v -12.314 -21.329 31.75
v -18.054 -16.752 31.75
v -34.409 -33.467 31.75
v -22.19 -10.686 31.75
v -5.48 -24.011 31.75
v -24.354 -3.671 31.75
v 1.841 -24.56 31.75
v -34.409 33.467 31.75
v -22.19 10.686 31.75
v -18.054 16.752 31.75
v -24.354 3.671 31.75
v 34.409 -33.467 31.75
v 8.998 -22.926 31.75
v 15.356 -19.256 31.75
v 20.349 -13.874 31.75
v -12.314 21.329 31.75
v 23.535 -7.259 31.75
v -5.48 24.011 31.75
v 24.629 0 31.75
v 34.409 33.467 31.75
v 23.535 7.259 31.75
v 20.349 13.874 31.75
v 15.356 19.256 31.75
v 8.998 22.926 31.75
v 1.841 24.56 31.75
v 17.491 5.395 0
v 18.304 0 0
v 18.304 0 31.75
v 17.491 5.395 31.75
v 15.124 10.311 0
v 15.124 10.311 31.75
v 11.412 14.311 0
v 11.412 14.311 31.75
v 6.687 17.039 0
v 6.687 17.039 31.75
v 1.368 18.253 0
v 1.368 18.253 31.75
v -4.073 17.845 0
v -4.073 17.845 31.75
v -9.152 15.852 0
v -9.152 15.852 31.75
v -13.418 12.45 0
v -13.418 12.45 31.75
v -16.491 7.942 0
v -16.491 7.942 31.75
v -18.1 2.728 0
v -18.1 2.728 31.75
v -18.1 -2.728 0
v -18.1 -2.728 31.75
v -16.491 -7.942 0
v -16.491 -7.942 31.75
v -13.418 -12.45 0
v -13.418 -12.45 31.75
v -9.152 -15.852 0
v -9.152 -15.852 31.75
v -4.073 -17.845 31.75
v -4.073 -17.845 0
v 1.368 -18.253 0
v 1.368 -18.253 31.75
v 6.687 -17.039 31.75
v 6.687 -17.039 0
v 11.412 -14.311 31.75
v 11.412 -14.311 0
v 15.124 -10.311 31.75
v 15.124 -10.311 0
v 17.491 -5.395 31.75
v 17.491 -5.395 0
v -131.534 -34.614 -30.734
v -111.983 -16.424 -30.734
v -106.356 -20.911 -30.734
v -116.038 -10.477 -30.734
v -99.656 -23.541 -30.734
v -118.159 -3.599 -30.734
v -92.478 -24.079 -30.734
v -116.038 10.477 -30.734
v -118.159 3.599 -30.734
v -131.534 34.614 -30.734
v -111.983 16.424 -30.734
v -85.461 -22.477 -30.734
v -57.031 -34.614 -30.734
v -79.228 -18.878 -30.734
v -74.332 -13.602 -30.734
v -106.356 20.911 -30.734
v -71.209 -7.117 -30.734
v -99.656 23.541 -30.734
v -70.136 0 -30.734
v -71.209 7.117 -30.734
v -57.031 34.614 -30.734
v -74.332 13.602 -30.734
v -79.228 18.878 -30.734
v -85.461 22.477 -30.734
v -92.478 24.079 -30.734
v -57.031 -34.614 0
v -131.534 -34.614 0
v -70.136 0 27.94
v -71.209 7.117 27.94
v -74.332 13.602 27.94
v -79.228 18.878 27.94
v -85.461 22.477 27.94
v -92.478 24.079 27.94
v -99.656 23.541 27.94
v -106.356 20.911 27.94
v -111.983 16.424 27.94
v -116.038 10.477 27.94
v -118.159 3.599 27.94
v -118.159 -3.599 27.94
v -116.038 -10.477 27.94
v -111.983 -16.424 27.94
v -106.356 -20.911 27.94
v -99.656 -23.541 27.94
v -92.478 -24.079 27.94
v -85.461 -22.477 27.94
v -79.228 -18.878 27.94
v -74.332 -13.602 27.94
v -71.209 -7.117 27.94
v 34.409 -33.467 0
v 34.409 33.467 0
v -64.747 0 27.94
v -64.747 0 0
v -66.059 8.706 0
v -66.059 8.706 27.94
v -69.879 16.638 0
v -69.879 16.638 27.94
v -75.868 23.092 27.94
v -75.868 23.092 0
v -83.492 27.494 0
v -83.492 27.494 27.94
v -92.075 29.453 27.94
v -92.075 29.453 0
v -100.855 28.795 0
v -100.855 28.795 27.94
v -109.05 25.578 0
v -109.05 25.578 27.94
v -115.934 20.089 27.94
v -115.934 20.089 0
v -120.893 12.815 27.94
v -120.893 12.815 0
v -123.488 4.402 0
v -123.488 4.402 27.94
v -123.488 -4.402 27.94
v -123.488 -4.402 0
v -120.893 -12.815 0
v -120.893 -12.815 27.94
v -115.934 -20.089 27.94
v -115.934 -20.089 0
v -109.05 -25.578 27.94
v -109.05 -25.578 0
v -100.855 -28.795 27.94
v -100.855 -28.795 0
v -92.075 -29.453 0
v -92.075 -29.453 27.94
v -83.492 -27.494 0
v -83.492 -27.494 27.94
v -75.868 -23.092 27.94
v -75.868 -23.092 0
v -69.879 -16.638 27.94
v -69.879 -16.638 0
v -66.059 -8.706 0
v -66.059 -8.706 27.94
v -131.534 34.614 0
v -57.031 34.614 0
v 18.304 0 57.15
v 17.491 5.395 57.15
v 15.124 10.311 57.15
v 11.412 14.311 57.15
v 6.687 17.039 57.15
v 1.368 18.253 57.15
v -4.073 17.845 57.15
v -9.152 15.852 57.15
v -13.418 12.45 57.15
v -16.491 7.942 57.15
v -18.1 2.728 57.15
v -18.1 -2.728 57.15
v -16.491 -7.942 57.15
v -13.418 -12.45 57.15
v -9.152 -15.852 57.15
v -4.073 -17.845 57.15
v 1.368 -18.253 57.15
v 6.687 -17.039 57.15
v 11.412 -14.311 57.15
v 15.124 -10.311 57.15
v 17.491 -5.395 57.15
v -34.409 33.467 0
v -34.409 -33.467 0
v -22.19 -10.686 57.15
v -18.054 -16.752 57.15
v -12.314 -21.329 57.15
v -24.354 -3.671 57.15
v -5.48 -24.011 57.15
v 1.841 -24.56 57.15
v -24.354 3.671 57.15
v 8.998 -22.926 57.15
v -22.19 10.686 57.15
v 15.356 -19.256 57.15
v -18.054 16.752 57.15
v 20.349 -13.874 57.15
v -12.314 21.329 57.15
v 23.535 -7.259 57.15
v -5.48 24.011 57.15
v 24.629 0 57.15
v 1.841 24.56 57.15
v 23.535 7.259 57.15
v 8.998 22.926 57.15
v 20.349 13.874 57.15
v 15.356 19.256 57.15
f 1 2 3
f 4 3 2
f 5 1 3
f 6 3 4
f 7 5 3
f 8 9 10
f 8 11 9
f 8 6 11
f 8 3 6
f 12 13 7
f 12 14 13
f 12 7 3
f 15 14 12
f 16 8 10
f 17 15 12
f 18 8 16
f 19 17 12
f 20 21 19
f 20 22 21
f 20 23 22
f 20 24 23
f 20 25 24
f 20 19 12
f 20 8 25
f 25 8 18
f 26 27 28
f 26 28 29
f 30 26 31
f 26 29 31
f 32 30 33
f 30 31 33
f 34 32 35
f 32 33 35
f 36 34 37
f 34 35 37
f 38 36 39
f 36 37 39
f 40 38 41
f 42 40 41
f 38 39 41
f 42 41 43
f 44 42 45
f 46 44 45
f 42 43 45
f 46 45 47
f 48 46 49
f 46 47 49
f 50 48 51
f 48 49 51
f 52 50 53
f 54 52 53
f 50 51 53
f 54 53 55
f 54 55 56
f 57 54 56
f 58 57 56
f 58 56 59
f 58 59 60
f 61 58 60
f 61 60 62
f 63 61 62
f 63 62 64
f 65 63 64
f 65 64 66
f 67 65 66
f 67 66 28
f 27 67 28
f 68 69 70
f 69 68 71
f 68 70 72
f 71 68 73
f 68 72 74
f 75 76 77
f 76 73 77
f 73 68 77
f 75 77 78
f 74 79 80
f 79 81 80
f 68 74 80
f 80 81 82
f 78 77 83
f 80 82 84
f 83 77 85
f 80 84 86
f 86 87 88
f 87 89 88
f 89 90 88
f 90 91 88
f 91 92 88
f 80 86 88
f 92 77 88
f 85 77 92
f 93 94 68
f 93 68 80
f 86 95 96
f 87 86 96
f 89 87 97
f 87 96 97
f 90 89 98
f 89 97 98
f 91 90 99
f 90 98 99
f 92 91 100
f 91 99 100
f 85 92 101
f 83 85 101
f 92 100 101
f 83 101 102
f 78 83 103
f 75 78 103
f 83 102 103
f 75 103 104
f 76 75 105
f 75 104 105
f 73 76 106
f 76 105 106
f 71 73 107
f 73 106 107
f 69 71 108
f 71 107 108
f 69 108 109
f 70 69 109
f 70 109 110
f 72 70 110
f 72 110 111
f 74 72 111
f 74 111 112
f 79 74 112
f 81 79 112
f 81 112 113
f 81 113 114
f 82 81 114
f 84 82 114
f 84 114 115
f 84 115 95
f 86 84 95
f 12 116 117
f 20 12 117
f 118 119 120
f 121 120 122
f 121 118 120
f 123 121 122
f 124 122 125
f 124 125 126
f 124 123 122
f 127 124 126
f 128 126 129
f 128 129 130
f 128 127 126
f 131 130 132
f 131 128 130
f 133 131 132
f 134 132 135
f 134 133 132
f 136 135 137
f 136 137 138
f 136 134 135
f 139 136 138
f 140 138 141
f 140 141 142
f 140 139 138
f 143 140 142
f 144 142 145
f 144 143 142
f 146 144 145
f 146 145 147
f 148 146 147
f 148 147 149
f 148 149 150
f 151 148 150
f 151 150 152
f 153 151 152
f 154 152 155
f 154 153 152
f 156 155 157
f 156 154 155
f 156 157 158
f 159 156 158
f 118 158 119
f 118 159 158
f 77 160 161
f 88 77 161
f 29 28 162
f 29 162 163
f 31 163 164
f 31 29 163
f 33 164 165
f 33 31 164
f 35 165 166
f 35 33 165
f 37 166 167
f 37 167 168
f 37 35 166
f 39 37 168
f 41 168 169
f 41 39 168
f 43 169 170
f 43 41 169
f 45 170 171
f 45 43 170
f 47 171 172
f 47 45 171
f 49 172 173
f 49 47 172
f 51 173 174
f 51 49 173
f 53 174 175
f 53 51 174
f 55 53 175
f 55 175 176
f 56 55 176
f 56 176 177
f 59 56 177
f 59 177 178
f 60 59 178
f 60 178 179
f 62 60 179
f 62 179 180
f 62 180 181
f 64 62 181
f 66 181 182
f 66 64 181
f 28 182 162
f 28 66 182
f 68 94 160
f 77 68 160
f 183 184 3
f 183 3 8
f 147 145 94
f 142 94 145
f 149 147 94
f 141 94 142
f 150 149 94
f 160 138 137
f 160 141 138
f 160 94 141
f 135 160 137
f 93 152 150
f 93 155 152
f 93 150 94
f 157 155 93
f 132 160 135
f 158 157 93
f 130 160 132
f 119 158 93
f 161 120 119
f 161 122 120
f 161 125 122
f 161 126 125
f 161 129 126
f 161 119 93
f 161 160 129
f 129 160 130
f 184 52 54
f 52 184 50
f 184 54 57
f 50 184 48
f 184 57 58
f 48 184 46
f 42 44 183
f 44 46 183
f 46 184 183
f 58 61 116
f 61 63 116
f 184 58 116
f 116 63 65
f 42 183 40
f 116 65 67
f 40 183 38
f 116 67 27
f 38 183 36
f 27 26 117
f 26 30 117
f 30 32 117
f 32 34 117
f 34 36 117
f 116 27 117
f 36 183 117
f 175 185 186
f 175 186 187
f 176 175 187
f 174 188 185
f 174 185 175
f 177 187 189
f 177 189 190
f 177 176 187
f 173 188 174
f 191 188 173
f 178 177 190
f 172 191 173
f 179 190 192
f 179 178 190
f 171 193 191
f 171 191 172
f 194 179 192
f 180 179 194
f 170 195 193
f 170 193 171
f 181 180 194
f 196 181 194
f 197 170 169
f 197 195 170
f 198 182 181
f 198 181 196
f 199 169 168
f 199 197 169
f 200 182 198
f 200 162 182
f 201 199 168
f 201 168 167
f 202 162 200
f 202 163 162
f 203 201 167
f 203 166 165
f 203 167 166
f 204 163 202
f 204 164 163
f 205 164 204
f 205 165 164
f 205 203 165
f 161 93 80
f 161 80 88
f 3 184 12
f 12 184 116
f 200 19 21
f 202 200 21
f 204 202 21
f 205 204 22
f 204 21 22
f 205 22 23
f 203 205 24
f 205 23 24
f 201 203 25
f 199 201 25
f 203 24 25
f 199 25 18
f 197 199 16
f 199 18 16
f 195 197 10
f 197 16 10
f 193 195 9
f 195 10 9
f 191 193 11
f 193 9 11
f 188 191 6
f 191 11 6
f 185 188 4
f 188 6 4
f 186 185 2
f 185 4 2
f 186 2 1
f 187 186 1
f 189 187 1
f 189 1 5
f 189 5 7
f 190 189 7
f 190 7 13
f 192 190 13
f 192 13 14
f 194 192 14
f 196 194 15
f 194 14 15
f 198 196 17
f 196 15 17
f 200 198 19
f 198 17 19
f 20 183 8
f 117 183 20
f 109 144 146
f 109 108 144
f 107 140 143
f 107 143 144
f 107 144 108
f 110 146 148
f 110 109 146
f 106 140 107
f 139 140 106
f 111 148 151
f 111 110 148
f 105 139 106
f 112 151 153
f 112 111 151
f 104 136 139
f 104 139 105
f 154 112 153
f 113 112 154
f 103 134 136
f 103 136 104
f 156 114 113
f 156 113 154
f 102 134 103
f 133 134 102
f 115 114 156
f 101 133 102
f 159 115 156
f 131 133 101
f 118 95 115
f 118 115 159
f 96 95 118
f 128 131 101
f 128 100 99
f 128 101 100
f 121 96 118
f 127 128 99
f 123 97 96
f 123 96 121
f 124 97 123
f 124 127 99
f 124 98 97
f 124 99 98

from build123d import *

# Parameters (mm, degrees)
F0_W      = 68.8170492649
F0_H      = 66.9333636761
F1_DEPTH  = 31.75
F2_R      = 18.3041335775
F3_DEPTH  = 140.462
F4_R      = 24.6288447619
F4_R_2    = 18.3041335775
F5_DEPTH  = 25.4
F6_W      = 74.5030492544
F6_H      = 69.2284926772
F6_R      = 24.1462933533
F7_DEPTH  = 30.734
F9_R      = 29.5354101633
F9_R_2    = 24.1462933533
F10_DEPTH = 27.94


with BuildPart() as f1:
    # F0 (on Top) → F1 (new body)
    with BuildSketch(Plane.XY):
        Rectangle(F0_W, F0_H)
    extrude(amount=F1_DEPTH)

    # F2 (on face) → F3 (cut)
    with BuildSketch(Plane.XY.offset(31.75)):
        Circle(F2_R)
    extrude(amount=-F3_DEPTH, mode=Mode.SUBTRACT)

    # F4 (on face) → F5 (join)
    with BuildSketch(Plane.XY.offset(31.75)):
        Circle(F4_R)
        Circle(F4_R_2, mode=Mode.SUBTRACT)
    extrude(amount=F5_DEPTH)


with BuildPart() as f7:
    # F6 (on Top) → F7 (new body)
    with BuildSketch(Plane.XY):
        with Locations((-94.2826196551, 0)):
            Rectangle(F6_W, F6_H)
        with Locations((-94.2826196551, 0)):
            Circle(F6_R, mode=Mode.SUBTRACT)
    extrude(amount=-F7_DEPTH)

    # F9 (on face) → F10 (join, symmetric)
    with BuildSketch(Plane.XY):
        with Locations((-94.2826196551, 0)):
            Circle(F9_R)
        with Locations((-94.2826196551, 0)):
            Circle(F9_R_2, mode=Mode.SUBTRACT)
    extrude(amount=F10_DEPTH, both=True)


solid = Compound([f1.part, f7.part])
